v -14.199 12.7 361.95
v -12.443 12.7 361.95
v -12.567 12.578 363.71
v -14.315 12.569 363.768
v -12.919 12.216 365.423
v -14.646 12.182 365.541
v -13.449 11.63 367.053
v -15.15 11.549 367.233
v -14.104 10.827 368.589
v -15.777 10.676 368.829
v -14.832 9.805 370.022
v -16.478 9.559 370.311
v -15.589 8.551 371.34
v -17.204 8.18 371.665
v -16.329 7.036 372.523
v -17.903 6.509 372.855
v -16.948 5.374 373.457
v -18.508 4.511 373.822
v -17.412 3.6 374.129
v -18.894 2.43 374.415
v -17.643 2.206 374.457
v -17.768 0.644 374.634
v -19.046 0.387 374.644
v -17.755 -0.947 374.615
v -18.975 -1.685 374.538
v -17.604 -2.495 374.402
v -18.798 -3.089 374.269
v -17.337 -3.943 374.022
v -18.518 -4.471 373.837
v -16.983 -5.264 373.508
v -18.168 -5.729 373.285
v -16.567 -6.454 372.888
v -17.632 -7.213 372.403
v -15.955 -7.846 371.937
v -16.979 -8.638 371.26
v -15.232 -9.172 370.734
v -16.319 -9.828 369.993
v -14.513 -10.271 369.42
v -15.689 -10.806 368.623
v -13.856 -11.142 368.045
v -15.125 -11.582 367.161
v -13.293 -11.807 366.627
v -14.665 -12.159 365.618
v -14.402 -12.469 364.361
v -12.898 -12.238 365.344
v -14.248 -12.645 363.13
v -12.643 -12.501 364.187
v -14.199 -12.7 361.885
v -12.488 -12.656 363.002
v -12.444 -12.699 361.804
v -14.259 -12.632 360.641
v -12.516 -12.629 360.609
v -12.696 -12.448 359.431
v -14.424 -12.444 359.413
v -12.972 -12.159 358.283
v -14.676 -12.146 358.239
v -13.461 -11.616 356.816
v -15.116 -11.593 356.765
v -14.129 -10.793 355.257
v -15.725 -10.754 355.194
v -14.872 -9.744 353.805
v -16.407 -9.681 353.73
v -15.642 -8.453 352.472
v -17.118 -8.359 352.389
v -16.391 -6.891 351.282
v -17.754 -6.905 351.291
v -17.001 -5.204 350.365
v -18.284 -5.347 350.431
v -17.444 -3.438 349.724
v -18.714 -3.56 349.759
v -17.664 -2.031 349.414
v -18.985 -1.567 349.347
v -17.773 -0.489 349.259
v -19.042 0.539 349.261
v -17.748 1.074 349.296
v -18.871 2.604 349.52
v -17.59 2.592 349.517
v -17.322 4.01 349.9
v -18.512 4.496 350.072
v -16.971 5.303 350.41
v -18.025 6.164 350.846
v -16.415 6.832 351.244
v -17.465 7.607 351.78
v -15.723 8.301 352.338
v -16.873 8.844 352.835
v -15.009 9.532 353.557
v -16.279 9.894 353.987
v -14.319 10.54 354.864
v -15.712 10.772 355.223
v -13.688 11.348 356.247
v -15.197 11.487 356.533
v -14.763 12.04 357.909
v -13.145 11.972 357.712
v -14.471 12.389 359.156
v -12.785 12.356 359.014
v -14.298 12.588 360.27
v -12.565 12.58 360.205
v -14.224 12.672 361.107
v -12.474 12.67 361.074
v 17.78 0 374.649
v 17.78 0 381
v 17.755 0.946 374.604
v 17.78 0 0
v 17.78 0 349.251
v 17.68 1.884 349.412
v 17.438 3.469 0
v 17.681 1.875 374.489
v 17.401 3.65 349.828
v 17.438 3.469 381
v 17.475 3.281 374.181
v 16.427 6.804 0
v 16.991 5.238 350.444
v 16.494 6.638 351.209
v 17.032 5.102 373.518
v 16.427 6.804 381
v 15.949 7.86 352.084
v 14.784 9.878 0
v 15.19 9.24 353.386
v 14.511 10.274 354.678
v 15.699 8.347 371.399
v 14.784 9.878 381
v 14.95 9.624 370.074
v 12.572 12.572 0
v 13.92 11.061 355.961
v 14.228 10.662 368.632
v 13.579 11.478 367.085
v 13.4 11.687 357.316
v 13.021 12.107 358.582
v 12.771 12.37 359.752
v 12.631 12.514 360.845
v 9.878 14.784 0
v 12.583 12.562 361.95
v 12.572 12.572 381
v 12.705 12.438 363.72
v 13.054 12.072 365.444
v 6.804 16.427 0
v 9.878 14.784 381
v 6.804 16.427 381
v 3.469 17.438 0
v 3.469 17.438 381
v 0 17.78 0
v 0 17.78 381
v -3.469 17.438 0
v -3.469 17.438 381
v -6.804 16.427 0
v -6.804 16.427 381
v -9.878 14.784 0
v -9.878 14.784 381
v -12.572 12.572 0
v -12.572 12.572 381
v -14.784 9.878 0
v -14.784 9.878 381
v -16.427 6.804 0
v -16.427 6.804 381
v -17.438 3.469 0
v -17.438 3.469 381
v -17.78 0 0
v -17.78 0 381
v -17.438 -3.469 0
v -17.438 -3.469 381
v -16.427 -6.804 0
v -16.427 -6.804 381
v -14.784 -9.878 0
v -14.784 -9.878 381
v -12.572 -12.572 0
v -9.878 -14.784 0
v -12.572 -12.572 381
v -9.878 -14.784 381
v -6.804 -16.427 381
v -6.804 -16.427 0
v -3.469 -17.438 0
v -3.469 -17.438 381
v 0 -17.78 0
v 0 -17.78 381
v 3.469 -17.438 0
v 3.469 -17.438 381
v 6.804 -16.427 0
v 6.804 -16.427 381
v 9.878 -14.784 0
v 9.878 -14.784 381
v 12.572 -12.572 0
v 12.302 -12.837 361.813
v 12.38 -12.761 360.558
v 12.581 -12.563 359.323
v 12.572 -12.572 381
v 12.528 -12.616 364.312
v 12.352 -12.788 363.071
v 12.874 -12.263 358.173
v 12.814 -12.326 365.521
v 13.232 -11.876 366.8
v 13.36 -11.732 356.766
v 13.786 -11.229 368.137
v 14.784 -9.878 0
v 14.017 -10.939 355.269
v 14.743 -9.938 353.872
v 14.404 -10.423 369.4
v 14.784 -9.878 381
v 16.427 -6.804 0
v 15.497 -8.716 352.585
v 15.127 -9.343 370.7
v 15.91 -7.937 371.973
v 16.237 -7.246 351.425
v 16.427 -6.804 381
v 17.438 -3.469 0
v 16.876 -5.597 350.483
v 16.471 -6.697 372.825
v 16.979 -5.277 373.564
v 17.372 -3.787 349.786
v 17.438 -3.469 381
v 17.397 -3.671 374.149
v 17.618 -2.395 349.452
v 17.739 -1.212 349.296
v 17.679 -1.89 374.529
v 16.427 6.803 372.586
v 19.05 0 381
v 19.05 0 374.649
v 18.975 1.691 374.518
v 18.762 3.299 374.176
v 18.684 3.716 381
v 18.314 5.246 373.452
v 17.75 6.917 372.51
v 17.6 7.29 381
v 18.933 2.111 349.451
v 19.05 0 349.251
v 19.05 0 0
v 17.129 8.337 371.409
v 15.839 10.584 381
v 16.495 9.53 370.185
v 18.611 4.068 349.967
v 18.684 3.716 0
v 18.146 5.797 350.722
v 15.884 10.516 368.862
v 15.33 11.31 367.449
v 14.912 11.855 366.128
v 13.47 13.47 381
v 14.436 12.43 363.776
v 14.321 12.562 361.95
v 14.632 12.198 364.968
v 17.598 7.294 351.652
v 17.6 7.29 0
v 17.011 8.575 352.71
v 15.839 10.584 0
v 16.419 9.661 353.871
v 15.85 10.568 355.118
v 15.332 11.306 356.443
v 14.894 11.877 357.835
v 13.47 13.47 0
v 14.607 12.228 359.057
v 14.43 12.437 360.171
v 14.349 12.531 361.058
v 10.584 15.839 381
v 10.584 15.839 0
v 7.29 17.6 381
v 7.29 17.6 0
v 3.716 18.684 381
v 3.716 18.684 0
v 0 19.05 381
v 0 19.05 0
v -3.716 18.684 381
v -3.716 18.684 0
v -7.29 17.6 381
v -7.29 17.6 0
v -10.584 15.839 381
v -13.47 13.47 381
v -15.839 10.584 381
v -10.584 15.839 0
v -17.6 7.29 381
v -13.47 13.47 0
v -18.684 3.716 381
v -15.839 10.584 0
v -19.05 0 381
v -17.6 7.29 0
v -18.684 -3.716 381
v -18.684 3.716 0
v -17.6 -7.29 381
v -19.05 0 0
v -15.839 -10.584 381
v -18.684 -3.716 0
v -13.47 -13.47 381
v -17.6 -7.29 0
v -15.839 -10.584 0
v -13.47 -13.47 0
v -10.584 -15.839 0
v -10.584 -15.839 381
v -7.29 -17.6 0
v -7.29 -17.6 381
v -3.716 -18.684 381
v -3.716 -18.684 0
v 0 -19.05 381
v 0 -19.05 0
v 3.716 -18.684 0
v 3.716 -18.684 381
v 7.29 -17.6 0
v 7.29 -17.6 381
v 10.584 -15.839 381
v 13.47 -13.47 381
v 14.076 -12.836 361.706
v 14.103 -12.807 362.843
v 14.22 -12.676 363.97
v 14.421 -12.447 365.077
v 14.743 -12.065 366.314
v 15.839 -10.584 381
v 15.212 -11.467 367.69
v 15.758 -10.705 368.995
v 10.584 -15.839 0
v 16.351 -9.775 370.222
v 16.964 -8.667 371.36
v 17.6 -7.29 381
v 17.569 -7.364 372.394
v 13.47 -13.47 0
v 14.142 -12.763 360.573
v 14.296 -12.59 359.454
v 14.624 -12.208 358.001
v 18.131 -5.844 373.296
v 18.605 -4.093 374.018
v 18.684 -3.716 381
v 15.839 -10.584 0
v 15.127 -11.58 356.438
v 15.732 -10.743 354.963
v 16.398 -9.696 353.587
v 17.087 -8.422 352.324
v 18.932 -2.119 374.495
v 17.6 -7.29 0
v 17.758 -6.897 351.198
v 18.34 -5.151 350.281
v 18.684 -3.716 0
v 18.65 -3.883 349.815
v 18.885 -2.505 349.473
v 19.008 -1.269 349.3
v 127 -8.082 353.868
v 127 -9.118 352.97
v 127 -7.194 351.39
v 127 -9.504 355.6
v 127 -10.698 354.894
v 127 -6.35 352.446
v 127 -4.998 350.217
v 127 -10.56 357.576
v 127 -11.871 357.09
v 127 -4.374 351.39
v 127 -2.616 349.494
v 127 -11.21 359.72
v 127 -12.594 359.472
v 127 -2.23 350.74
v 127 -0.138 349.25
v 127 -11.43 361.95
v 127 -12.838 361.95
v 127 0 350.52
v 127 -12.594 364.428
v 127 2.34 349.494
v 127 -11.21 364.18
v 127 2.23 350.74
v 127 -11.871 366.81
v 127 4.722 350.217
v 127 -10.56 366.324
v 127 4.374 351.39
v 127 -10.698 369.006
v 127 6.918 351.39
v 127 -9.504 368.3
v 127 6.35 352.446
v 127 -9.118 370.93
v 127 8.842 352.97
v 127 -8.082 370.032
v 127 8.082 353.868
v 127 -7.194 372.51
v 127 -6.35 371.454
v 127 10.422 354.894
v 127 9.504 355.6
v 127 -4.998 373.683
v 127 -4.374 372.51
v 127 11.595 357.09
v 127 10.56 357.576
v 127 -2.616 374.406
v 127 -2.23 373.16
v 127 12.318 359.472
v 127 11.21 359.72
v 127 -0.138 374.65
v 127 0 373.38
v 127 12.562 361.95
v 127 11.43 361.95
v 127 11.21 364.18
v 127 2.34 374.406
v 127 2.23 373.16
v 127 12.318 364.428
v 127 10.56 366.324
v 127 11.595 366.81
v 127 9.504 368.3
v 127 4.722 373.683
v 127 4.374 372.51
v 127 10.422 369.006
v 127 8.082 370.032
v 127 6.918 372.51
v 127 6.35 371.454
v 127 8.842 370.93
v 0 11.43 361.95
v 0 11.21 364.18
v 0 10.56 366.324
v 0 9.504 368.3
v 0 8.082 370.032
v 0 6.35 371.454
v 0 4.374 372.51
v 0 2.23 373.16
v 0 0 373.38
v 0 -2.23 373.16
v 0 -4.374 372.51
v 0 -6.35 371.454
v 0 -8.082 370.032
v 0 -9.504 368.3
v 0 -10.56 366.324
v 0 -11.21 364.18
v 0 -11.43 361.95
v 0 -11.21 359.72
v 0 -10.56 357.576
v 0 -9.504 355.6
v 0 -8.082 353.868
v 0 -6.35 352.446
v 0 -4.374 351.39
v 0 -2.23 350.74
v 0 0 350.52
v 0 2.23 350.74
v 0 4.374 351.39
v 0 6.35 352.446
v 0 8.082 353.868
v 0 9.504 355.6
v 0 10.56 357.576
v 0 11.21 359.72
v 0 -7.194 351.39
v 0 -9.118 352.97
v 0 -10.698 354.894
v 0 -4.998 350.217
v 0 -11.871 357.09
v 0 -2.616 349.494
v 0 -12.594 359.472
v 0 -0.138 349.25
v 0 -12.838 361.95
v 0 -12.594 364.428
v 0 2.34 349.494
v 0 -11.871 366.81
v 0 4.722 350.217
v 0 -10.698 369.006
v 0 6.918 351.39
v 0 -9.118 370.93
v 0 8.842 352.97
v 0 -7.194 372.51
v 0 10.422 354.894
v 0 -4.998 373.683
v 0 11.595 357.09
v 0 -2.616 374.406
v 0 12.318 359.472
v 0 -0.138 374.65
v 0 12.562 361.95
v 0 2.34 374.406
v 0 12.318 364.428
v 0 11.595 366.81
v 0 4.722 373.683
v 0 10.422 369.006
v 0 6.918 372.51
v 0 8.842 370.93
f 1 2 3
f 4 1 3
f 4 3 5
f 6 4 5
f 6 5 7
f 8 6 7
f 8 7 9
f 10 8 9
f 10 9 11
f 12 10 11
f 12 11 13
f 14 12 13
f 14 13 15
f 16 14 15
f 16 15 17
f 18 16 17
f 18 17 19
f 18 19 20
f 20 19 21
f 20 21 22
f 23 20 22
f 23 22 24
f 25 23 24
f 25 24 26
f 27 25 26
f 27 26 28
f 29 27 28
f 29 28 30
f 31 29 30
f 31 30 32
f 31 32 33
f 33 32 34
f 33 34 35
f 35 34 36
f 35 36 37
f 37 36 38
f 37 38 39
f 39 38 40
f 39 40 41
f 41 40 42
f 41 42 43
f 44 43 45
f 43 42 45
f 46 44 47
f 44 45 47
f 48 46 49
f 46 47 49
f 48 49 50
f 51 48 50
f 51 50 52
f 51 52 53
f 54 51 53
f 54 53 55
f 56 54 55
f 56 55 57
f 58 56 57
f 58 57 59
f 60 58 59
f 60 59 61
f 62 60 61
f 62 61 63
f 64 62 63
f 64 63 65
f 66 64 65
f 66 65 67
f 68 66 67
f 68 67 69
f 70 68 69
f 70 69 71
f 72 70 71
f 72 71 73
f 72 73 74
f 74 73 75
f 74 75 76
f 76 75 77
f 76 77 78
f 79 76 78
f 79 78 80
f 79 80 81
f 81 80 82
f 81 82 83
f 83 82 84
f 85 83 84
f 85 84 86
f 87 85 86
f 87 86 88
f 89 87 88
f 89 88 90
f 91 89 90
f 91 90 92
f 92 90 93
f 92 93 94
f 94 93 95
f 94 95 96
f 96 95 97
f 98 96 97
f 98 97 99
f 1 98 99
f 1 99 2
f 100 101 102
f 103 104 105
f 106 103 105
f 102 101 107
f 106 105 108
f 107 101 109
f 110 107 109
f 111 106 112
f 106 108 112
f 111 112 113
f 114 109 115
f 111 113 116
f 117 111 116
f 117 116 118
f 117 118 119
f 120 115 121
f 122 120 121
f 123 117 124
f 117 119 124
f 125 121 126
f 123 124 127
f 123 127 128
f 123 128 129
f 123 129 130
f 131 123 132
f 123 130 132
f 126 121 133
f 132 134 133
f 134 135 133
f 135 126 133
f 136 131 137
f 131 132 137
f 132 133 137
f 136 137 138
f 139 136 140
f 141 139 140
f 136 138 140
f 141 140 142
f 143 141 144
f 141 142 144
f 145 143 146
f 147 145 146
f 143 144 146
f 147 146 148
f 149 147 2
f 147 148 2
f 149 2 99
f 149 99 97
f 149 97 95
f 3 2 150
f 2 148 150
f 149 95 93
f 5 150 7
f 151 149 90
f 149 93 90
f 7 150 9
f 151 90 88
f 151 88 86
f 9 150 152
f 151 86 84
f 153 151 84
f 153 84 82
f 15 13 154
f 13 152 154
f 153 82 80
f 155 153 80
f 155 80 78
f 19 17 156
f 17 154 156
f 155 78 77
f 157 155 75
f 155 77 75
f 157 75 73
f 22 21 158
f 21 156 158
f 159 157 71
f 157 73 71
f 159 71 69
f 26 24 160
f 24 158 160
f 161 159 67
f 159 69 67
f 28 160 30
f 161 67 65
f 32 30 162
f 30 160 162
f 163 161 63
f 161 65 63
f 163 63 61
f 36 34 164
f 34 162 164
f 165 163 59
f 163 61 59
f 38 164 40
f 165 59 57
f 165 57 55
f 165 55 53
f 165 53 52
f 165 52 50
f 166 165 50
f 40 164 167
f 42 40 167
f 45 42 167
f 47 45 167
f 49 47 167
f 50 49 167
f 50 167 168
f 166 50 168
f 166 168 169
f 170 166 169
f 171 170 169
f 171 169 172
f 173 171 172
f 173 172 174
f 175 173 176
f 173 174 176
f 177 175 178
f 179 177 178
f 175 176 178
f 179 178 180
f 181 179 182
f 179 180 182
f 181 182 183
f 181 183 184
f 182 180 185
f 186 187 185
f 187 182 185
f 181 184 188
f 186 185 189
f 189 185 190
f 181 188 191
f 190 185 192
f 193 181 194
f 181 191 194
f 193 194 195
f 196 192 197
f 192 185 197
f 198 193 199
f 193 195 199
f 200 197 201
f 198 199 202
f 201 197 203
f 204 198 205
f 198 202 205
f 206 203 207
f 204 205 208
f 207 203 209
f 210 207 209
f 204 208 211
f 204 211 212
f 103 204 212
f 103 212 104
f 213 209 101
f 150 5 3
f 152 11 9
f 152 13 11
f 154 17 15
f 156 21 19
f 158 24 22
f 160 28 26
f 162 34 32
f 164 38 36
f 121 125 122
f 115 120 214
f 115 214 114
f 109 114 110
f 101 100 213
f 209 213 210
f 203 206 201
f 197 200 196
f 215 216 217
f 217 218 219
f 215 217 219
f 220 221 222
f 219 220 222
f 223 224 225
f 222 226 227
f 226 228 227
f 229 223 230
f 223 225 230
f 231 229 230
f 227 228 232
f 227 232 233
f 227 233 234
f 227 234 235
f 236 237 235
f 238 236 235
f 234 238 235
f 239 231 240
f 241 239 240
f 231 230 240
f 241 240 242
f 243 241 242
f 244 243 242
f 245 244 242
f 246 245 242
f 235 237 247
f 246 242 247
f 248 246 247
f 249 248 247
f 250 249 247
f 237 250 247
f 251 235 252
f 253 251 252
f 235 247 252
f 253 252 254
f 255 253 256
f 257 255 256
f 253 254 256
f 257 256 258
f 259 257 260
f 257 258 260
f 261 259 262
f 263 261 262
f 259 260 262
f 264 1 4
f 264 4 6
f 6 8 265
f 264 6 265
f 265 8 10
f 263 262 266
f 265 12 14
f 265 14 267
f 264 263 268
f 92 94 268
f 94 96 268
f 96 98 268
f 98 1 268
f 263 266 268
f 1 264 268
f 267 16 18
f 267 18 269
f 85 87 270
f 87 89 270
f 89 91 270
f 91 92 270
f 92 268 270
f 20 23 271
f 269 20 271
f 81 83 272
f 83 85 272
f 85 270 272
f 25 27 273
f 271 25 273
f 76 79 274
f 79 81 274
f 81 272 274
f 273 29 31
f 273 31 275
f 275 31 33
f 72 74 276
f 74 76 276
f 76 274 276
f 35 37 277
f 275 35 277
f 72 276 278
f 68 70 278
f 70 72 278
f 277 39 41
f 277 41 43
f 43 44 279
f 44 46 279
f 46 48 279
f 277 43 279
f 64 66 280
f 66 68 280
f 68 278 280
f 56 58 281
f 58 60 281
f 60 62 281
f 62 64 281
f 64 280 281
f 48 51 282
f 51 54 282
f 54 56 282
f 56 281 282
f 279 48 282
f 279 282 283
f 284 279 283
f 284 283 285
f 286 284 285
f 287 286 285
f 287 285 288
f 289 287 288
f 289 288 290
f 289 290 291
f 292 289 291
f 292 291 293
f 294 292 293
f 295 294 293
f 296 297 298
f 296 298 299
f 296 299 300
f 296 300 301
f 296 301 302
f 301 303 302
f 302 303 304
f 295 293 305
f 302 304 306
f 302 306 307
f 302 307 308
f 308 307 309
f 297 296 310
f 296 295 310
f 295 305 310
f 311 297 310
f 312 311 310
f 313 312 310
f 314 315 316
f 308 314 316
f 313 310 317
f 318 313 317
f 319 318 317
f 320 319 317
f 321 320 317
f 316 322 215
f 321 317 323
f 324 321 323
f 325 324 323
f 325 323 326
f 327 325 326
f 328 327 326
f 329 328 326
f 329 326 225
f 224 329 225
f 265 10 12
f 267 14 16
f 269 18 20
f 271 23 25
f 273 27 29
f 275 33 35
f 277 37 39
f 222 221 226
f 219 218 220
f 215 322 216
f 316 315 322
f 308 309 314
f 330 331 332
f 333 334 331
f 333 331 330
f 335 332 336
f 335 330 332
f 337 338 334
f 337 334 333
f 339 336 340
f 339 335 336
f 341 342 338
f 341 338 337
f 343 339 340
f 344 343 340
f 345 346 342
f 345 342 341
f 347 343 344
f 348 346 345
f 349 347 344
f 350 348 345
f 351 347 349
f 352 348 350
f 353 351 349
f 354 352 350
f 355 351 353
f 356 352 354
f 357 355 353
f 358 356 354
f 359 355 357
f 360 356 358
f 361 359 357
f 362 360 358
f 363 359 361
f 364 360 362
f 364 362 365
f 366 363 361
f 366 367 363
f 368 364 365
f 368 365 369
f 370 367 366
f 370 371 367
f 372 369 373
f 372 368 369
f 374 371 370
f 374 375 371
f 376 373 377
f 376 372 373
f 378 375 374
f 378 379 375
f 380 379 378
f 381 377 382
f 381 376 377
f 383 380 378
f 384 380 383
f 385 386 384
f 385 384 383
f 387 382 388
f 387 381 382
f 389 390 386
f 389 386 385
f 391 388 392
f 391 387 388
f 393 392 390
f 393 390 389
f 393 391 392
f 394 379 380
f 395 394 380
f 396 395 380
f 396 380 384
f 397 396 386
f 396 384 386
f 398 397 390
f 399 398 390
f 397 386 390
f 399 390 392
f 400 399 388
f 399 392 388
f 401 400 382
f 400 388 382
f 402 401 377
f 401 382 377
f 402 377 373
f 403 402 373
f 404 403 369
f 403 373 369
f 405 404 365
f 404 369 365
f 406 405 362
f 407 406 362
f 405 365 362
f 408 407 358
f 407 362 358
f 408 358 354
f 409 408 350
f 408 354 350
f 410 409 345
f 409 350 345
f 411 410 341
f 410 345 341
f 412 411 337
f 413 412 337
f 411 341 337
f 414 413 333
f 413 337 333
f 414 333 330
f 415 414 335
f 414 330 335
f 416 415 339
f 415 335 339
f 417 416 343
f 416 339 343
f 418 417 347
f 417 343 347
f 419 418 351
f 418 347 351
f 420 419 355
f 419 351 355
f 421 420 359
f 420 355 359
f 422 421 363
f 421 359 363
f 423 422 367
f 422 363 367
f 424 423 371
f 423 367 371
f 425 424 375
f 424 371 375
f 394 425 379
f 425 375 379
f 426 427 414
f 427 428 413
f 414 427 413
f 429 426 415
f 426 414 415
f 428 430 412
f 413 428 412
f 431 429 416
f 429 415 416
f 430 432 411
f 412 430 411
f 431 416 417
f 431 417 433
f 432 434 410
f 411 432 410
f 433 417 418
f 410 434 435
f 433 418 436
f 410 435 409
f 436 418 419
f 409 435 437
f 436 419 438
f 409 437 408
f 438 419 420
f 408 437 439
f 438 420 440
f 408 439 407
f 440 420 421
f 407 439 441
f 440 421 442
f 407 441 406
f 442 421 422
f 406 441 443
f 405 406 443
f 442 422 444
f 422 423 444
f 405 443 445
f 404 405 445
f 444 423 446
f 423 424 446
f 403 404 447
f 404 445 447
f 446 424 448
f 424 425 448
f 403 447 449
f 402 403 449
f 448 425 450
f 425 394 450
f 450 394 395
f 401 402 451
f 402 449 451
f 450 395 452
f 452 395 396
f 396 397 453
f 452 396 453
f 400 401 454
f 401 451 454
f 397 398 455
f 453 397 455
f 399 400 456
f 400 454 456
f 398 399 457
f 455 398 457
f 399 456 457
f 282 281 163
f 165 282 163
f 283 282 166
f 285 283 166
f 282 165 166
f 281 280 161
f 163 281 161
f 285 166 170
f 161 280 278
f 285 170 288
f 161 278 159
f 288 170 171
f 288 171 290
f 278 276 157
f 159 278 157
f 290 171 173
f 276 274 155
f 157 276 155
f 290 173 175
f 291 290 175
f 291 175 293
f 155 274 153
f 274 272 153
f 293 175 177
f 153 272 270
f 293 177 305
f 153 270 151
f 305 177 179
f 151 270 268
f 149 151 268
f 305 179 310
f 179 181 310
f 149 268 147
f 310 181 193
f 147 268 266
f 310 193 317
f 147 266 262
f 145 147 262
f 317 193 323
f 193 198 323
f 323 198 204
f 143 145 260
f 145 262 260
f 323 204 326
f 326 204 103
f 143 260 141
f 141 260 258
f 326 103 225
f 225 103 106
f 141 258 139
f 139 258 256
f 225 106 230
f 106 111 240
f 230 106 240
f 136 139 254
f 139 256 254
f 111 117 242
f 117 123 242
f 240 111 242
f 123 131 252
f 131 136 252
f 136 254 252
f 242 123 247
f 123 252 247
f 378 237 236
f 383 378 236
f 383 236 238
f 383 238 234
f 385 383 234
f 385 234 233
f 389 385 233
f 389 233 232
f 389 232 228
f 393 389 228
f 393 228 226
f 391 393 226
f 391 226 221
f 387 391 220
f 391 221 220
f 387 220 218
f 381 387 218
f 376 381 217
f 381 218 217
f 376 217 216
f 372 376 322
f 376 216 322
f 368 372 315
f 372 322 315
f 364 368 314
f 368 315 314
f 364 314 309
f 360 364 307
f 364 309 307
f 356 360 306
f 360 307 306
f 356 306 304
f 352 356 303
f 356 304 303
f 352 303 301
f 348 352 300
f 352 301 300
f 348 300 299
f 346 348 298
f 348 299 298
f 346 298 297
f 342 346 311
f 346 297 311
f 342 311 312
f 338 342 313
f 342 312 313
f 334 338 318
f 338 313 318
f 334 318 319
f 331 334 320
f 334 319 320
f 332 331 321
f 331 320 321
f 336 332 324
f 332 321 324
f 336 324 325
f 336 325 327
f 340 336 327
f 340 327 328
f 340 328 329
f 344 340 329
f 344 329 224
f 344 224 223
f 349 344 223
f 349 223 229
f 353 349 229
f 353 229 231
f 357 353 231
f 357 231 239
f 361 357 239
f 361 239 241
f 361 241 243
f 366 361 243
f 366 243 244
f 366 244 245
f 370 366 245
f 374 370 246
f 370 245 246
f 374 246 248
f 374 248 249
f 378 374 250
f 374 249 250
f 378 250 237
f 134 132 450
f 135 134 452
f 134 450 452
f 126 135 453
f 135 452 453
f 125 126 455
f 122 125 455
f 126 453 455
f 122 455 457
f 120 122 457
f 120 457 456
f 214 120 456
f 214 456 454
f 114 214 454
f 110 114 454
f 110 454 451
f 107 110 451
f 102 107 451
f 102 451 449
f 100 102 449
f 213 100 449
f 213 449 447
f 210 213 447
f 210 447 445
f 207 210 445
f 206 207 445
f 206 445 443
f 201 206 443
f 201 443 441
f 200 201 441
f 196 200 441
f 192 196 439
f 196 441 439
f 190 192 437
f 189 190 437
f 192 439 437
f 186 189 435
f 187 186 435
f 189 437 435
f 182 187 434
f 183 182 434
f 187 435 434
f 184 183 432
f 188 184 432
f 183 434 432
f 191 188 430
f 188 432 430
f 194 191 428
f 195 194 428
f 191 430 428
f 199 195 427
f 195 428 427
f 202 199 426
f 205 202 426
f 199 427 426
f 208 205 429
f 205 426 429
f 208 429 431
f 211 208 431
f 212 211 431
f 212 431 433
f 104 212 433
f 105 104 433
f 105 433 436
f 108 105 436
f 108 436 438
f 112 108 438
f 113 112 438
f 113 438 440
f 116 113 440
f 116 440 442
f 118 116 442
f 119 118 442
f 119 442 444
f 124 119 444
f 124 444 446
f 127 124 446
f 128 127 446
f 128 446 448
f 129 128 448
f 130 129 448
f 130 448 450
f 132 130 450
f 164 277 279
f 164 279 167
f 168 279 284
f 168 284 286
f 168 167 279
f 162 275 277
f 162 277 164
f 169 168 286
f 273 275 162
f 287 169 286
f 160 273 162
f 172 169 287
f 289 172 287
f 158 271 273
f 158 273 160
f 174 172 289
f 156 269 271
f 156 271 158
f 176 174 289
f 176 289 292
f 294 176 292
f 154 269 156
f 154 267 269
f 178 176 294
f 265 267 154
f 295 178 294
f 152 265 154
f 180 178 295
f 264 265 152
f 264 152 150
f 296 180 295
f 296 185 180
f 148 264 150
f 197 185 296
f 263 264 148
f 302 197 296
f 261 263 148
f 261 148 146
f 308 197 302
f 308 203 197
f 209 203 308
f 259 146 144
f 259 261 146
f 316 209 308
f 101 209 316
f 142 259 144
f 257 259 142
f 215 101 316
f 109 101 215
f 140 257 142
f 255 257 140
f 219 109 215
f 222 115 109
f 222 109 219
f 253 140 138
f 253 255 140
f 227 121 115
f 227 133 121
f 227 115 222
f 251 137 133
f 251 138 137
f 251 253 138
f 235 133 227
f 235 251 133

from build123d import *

# Parameters (mm, degrees)
F0_R     = 19.05
F1_DEPTH = 381
F2_R     = 17.78
F3_DEPTH = 381
F4_R     = 12.7
F5_DEPTH = 127
F6_R     = 11.43
F7_DEPTH = 127
F8_R     = 12.7
F9_DEPTH = 25.4


with BuildPart() as f1:
    # F0 (on Top) → F1 (new body)
    with BuildSketch(Plane.XY):
        Circle(F0_R)
    extrude(amount=F1_DEPTH)

    # F2 (on face) → F3 (cut)
    with BuildSketch(Plane.XY.offset(381)):
        Circle(F2_R)
    extrude(amount=-F3_DEPTH, mode=Mode.SUBTRACT)

    # F4 (on Right) → F5 (join)
    with BuildSketch(Plane.YZ):
        with Locations((-0.138039, 361.95)):
            Circle(F4_R)
    extrude(amount=F5_DEPTH)

    # F6 (on face) → F7 (cut)
    with BuildSketch(Plane.YZ.offset(127)):
        with Locations((0, 361.95)):
            Circle(F6_R)
    extrude(amount=-F7_DEPTH, mode=Mode.SUBTRACT)

    # F8 (on Right) → F9 (cut)
    with BuildSketch(Plane.YZ):
        with Locations((0.0001, 361.95)):
            Circle(F8_R)
    extrude(amount=-F9_DEPTH, mode=Mode.SUBTRACT)


solid = f1.part
